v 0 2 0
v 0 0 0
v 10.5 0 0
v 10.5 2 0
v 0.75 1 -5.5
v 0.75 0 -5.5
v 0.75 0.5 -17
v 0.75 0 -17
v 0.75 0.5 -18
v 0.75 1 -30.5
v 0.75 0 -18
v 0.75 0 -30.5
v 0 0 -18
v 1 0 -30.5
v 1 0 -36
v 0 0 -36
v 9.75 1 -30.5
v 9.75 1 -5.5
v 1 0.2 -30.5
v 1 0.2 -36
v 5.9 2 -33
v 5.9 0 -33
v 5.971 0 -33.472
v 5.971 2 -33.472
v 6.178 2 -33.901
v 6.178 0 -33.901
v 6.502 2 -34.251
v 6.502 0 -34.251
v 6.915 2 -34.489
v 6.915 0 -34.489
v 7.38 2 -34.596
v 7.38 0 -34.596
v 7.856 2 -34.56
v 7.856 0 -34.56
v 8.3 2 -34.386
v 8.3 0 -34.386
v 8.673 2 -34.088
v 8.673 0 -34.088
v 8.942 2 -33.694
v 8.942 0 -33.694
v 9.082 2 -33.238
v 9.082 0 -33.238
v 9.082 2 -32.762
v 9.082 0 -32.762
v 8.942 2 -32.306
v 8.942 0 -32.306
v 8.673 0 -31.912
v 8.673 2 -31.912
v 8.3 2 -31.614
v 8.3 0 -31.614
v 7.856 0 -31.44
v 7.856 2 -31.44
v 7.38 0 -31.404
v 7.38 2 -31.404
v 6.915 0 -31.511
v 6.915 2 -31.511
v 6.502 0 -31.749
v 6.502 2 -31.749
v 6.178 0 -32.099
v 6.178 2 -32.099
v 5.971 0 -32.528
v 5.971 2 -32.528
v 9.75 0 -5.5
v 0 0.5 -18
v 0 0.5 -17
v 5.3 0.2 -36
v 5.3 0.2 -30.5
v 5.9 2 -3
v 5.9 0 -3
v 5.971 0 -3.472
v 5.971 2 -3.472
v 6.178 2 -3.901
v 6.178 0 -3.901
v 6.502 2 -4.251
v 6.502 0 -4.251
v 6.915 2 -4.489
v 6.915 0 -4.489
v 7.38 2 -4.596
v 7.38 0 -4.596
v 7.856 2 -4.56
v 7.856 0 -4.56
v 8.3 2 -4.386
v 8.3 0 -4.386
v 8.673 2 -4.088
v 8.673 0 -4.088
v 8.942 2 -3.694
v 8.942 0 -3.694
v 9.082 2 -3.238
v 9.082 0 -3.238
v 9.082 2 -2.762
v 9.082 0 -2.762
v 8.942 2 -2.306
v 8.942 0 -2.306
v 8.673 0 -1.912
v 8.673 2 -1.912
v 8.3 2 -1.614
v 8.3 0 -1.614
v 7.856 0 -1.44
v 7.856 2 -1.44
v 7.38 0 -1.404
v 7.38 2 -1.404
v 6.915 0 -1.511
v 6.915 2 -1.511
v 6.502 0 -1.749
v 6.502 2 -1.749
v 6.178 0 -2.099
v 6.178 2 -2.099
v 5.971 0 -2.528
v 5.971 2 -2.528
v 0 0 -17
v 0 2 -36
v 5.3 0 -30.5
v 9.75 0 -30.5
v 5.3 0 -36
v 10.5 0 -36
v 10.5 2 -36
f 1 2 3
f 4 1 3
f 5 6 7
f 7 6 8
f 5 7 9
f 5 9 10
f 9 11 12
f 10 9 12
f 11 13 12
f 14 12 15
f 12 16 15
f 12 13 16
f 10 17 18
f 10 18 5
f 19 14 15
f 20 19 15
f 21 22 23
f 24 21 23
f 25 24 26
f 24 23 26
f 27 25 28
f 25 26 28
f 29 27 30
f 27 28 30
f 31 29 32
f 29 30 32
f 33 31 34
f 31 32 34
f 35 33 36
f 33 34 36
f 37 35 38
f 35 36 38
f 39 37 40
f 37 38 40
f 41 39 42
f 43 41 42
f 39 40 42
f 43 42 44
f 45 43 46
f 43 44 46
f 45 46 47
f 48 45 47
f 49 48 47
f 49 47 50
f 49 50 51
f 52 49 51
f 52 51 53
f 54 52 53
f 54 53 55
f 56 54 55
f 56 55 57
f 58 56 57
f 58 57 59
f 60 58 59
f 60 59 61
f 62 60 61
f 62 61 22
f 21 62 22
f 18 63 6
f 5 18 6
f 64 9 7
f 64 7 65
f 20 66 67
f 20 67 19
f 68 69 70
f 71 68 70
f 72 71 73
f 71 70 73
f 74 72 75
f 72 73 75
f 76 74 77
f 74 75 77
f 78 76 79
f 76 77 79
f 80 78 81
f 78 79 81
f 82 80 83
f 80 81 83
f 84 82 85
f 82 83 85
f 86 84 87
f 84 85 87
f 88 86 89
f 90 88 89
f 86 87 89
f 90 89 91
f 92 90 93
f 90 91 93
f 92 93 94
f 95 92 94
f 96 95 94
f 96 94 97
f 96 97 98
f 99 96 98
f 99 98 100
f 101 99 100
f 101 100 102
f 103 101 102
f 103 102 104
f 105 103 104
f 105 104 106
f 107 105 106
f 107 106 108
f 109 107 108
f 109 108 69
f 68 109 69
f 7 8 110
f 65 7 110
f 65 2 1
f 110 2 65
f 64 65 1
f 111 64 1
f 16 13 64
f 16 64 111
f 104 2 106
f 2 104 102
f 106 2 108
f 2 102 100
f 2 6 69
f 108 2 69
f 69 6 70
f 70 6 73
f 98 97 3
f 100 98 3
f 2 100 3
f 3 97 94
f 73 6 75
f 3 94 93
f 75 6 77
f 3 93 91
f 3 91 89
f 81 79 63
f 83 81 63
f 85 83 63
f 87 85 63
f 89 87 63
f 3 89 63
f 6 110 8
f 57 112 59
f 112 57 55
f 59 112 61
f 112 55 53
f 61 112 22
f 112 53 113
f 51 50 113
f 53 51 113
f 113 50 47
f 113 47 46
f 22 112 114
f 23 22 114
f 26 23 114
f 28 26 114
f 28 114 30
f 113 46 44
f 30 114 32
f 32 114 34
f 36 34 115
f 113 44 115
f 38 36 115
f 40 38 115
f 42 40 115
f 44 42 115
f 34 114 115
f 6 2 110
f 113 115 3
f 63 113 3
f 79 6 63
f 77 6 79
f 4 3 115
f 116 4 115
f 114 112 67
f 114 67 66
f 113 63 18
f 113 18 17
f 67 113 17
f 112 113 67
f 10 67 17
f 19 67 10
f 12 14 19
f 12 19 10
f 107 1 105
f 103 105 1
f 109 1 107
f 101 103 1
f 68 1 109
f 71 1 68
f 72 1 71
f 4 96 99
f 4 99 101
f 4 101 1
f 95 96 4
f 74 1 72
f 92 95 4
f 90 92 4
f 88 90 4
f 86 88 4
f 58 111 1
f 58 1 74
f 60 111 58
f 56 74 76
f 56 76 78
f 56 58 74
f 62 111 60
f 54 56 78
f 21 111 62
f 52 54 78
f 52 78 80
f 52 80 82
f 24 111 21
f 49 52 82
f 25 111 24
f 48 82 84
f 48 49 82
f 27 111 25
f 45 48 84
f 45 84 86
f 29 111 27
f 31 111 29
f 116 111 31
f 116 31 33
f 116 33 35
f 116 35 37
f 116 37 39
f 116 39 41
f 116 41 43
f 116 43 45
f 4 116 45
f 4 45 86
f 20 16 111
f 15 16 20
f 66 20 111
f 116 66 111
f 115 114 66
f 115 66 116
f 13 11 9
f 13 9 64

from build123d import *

# Parameters (mm, degrees)
SKETCH_1_W          = 10.5
SKETCH_1_H          = 36
EXTRUDE_1_DEPTH     = 2
SKETCH_2_R          = 1.6
CUT_EXTRUDE_1_DEPTH = 3
SKETCH_3_W          = 9
SKETCH_3_H          = 25
CUT_EXTRUDE_2_DEPTH = 1
SKETCH_6_W          = 0.75
SKETCH_6_H          = 1
CUT_EXTRUDE_3_DEPTH = 0.5
SKETCH_7_W          = 4.3
SKETCH_7_H          = 5.5
CUT_EXTRUDE_4_DEPTH = 0.2


with BuildPart() as part:
    # 草图1 → 凸台-拉伸1 (new body)
    with BuildSketch(Plane(origin=(0, 0, 0), x_dir=(1, 0, 0), z_dir=(0, 1, 0))):
        with Locations((5.25, 18)):
            Rectangle(SKETCH_1_W, SKETCH_1_H)
    extrude(amount=EXTRUDE_1_DEPTH)

    # 草图2 → 切除-拉伸1 (cut, through all)
    with BuildSketch(Plane(origin=(0, 0, 0), x_dir=(-1, 0, 0), z_dir=(0, -1, 0))):
        with Locations((-7.5, 33)):
            Circle(SKETCH_2_R)
        with Locations((-7.5, 3)):
            Circle(SKETCH_2_R)
    extrude(amount=-CUT_EXTRUDE_1_DEPTH, mode=Mode.SUBTRACT)

    # 草图3 → 切除-拉伸2 (cut)
    with BuildSketch(Plane(origin=(0, 0, 0), x_dir=(-1, 0, 0), z_dir=(0, -1, 0))):
        with Locations((-5.25, 18)):
            Rectangle(SKETCH_3_W, SKETCH_3_H)
    extrude(amount=-CUT_EXTRUDE_2_DEPTH, mode=Mode.SUBTRACT)

    # 草图6 → 切除-拉伸3 (cut)
    with BuildSketch(Plane(origin=(0, 0, 0), x_dir=(-1, 0, 0), z_dir=(0, -1, 0))):
        with Locations((-0.375, 17.5)):
            Rectangle(SKETCH_6_W, SKETCH_6_H)
    extrude(amount=-CUT_EXTRUDE_3_DEPTH, mode=Mode.SUBTRACT)

    # 草图7 → 切除-拉伸4 (cut)
    with BuildSketch(Plane(origin=(0, 0, 0), x_dir=(-1, 0, 0), z_dir=(0, -1, 0))):
        with Locations((-3.15, 33.25)):
            Rectangle(SKETCH_7_W, SKETCH_7_H)
    extrude(amount=-CUT_EXTRUDE_4_DEPTH, mode=Mode.SUBTRACT)


solid = part.part
